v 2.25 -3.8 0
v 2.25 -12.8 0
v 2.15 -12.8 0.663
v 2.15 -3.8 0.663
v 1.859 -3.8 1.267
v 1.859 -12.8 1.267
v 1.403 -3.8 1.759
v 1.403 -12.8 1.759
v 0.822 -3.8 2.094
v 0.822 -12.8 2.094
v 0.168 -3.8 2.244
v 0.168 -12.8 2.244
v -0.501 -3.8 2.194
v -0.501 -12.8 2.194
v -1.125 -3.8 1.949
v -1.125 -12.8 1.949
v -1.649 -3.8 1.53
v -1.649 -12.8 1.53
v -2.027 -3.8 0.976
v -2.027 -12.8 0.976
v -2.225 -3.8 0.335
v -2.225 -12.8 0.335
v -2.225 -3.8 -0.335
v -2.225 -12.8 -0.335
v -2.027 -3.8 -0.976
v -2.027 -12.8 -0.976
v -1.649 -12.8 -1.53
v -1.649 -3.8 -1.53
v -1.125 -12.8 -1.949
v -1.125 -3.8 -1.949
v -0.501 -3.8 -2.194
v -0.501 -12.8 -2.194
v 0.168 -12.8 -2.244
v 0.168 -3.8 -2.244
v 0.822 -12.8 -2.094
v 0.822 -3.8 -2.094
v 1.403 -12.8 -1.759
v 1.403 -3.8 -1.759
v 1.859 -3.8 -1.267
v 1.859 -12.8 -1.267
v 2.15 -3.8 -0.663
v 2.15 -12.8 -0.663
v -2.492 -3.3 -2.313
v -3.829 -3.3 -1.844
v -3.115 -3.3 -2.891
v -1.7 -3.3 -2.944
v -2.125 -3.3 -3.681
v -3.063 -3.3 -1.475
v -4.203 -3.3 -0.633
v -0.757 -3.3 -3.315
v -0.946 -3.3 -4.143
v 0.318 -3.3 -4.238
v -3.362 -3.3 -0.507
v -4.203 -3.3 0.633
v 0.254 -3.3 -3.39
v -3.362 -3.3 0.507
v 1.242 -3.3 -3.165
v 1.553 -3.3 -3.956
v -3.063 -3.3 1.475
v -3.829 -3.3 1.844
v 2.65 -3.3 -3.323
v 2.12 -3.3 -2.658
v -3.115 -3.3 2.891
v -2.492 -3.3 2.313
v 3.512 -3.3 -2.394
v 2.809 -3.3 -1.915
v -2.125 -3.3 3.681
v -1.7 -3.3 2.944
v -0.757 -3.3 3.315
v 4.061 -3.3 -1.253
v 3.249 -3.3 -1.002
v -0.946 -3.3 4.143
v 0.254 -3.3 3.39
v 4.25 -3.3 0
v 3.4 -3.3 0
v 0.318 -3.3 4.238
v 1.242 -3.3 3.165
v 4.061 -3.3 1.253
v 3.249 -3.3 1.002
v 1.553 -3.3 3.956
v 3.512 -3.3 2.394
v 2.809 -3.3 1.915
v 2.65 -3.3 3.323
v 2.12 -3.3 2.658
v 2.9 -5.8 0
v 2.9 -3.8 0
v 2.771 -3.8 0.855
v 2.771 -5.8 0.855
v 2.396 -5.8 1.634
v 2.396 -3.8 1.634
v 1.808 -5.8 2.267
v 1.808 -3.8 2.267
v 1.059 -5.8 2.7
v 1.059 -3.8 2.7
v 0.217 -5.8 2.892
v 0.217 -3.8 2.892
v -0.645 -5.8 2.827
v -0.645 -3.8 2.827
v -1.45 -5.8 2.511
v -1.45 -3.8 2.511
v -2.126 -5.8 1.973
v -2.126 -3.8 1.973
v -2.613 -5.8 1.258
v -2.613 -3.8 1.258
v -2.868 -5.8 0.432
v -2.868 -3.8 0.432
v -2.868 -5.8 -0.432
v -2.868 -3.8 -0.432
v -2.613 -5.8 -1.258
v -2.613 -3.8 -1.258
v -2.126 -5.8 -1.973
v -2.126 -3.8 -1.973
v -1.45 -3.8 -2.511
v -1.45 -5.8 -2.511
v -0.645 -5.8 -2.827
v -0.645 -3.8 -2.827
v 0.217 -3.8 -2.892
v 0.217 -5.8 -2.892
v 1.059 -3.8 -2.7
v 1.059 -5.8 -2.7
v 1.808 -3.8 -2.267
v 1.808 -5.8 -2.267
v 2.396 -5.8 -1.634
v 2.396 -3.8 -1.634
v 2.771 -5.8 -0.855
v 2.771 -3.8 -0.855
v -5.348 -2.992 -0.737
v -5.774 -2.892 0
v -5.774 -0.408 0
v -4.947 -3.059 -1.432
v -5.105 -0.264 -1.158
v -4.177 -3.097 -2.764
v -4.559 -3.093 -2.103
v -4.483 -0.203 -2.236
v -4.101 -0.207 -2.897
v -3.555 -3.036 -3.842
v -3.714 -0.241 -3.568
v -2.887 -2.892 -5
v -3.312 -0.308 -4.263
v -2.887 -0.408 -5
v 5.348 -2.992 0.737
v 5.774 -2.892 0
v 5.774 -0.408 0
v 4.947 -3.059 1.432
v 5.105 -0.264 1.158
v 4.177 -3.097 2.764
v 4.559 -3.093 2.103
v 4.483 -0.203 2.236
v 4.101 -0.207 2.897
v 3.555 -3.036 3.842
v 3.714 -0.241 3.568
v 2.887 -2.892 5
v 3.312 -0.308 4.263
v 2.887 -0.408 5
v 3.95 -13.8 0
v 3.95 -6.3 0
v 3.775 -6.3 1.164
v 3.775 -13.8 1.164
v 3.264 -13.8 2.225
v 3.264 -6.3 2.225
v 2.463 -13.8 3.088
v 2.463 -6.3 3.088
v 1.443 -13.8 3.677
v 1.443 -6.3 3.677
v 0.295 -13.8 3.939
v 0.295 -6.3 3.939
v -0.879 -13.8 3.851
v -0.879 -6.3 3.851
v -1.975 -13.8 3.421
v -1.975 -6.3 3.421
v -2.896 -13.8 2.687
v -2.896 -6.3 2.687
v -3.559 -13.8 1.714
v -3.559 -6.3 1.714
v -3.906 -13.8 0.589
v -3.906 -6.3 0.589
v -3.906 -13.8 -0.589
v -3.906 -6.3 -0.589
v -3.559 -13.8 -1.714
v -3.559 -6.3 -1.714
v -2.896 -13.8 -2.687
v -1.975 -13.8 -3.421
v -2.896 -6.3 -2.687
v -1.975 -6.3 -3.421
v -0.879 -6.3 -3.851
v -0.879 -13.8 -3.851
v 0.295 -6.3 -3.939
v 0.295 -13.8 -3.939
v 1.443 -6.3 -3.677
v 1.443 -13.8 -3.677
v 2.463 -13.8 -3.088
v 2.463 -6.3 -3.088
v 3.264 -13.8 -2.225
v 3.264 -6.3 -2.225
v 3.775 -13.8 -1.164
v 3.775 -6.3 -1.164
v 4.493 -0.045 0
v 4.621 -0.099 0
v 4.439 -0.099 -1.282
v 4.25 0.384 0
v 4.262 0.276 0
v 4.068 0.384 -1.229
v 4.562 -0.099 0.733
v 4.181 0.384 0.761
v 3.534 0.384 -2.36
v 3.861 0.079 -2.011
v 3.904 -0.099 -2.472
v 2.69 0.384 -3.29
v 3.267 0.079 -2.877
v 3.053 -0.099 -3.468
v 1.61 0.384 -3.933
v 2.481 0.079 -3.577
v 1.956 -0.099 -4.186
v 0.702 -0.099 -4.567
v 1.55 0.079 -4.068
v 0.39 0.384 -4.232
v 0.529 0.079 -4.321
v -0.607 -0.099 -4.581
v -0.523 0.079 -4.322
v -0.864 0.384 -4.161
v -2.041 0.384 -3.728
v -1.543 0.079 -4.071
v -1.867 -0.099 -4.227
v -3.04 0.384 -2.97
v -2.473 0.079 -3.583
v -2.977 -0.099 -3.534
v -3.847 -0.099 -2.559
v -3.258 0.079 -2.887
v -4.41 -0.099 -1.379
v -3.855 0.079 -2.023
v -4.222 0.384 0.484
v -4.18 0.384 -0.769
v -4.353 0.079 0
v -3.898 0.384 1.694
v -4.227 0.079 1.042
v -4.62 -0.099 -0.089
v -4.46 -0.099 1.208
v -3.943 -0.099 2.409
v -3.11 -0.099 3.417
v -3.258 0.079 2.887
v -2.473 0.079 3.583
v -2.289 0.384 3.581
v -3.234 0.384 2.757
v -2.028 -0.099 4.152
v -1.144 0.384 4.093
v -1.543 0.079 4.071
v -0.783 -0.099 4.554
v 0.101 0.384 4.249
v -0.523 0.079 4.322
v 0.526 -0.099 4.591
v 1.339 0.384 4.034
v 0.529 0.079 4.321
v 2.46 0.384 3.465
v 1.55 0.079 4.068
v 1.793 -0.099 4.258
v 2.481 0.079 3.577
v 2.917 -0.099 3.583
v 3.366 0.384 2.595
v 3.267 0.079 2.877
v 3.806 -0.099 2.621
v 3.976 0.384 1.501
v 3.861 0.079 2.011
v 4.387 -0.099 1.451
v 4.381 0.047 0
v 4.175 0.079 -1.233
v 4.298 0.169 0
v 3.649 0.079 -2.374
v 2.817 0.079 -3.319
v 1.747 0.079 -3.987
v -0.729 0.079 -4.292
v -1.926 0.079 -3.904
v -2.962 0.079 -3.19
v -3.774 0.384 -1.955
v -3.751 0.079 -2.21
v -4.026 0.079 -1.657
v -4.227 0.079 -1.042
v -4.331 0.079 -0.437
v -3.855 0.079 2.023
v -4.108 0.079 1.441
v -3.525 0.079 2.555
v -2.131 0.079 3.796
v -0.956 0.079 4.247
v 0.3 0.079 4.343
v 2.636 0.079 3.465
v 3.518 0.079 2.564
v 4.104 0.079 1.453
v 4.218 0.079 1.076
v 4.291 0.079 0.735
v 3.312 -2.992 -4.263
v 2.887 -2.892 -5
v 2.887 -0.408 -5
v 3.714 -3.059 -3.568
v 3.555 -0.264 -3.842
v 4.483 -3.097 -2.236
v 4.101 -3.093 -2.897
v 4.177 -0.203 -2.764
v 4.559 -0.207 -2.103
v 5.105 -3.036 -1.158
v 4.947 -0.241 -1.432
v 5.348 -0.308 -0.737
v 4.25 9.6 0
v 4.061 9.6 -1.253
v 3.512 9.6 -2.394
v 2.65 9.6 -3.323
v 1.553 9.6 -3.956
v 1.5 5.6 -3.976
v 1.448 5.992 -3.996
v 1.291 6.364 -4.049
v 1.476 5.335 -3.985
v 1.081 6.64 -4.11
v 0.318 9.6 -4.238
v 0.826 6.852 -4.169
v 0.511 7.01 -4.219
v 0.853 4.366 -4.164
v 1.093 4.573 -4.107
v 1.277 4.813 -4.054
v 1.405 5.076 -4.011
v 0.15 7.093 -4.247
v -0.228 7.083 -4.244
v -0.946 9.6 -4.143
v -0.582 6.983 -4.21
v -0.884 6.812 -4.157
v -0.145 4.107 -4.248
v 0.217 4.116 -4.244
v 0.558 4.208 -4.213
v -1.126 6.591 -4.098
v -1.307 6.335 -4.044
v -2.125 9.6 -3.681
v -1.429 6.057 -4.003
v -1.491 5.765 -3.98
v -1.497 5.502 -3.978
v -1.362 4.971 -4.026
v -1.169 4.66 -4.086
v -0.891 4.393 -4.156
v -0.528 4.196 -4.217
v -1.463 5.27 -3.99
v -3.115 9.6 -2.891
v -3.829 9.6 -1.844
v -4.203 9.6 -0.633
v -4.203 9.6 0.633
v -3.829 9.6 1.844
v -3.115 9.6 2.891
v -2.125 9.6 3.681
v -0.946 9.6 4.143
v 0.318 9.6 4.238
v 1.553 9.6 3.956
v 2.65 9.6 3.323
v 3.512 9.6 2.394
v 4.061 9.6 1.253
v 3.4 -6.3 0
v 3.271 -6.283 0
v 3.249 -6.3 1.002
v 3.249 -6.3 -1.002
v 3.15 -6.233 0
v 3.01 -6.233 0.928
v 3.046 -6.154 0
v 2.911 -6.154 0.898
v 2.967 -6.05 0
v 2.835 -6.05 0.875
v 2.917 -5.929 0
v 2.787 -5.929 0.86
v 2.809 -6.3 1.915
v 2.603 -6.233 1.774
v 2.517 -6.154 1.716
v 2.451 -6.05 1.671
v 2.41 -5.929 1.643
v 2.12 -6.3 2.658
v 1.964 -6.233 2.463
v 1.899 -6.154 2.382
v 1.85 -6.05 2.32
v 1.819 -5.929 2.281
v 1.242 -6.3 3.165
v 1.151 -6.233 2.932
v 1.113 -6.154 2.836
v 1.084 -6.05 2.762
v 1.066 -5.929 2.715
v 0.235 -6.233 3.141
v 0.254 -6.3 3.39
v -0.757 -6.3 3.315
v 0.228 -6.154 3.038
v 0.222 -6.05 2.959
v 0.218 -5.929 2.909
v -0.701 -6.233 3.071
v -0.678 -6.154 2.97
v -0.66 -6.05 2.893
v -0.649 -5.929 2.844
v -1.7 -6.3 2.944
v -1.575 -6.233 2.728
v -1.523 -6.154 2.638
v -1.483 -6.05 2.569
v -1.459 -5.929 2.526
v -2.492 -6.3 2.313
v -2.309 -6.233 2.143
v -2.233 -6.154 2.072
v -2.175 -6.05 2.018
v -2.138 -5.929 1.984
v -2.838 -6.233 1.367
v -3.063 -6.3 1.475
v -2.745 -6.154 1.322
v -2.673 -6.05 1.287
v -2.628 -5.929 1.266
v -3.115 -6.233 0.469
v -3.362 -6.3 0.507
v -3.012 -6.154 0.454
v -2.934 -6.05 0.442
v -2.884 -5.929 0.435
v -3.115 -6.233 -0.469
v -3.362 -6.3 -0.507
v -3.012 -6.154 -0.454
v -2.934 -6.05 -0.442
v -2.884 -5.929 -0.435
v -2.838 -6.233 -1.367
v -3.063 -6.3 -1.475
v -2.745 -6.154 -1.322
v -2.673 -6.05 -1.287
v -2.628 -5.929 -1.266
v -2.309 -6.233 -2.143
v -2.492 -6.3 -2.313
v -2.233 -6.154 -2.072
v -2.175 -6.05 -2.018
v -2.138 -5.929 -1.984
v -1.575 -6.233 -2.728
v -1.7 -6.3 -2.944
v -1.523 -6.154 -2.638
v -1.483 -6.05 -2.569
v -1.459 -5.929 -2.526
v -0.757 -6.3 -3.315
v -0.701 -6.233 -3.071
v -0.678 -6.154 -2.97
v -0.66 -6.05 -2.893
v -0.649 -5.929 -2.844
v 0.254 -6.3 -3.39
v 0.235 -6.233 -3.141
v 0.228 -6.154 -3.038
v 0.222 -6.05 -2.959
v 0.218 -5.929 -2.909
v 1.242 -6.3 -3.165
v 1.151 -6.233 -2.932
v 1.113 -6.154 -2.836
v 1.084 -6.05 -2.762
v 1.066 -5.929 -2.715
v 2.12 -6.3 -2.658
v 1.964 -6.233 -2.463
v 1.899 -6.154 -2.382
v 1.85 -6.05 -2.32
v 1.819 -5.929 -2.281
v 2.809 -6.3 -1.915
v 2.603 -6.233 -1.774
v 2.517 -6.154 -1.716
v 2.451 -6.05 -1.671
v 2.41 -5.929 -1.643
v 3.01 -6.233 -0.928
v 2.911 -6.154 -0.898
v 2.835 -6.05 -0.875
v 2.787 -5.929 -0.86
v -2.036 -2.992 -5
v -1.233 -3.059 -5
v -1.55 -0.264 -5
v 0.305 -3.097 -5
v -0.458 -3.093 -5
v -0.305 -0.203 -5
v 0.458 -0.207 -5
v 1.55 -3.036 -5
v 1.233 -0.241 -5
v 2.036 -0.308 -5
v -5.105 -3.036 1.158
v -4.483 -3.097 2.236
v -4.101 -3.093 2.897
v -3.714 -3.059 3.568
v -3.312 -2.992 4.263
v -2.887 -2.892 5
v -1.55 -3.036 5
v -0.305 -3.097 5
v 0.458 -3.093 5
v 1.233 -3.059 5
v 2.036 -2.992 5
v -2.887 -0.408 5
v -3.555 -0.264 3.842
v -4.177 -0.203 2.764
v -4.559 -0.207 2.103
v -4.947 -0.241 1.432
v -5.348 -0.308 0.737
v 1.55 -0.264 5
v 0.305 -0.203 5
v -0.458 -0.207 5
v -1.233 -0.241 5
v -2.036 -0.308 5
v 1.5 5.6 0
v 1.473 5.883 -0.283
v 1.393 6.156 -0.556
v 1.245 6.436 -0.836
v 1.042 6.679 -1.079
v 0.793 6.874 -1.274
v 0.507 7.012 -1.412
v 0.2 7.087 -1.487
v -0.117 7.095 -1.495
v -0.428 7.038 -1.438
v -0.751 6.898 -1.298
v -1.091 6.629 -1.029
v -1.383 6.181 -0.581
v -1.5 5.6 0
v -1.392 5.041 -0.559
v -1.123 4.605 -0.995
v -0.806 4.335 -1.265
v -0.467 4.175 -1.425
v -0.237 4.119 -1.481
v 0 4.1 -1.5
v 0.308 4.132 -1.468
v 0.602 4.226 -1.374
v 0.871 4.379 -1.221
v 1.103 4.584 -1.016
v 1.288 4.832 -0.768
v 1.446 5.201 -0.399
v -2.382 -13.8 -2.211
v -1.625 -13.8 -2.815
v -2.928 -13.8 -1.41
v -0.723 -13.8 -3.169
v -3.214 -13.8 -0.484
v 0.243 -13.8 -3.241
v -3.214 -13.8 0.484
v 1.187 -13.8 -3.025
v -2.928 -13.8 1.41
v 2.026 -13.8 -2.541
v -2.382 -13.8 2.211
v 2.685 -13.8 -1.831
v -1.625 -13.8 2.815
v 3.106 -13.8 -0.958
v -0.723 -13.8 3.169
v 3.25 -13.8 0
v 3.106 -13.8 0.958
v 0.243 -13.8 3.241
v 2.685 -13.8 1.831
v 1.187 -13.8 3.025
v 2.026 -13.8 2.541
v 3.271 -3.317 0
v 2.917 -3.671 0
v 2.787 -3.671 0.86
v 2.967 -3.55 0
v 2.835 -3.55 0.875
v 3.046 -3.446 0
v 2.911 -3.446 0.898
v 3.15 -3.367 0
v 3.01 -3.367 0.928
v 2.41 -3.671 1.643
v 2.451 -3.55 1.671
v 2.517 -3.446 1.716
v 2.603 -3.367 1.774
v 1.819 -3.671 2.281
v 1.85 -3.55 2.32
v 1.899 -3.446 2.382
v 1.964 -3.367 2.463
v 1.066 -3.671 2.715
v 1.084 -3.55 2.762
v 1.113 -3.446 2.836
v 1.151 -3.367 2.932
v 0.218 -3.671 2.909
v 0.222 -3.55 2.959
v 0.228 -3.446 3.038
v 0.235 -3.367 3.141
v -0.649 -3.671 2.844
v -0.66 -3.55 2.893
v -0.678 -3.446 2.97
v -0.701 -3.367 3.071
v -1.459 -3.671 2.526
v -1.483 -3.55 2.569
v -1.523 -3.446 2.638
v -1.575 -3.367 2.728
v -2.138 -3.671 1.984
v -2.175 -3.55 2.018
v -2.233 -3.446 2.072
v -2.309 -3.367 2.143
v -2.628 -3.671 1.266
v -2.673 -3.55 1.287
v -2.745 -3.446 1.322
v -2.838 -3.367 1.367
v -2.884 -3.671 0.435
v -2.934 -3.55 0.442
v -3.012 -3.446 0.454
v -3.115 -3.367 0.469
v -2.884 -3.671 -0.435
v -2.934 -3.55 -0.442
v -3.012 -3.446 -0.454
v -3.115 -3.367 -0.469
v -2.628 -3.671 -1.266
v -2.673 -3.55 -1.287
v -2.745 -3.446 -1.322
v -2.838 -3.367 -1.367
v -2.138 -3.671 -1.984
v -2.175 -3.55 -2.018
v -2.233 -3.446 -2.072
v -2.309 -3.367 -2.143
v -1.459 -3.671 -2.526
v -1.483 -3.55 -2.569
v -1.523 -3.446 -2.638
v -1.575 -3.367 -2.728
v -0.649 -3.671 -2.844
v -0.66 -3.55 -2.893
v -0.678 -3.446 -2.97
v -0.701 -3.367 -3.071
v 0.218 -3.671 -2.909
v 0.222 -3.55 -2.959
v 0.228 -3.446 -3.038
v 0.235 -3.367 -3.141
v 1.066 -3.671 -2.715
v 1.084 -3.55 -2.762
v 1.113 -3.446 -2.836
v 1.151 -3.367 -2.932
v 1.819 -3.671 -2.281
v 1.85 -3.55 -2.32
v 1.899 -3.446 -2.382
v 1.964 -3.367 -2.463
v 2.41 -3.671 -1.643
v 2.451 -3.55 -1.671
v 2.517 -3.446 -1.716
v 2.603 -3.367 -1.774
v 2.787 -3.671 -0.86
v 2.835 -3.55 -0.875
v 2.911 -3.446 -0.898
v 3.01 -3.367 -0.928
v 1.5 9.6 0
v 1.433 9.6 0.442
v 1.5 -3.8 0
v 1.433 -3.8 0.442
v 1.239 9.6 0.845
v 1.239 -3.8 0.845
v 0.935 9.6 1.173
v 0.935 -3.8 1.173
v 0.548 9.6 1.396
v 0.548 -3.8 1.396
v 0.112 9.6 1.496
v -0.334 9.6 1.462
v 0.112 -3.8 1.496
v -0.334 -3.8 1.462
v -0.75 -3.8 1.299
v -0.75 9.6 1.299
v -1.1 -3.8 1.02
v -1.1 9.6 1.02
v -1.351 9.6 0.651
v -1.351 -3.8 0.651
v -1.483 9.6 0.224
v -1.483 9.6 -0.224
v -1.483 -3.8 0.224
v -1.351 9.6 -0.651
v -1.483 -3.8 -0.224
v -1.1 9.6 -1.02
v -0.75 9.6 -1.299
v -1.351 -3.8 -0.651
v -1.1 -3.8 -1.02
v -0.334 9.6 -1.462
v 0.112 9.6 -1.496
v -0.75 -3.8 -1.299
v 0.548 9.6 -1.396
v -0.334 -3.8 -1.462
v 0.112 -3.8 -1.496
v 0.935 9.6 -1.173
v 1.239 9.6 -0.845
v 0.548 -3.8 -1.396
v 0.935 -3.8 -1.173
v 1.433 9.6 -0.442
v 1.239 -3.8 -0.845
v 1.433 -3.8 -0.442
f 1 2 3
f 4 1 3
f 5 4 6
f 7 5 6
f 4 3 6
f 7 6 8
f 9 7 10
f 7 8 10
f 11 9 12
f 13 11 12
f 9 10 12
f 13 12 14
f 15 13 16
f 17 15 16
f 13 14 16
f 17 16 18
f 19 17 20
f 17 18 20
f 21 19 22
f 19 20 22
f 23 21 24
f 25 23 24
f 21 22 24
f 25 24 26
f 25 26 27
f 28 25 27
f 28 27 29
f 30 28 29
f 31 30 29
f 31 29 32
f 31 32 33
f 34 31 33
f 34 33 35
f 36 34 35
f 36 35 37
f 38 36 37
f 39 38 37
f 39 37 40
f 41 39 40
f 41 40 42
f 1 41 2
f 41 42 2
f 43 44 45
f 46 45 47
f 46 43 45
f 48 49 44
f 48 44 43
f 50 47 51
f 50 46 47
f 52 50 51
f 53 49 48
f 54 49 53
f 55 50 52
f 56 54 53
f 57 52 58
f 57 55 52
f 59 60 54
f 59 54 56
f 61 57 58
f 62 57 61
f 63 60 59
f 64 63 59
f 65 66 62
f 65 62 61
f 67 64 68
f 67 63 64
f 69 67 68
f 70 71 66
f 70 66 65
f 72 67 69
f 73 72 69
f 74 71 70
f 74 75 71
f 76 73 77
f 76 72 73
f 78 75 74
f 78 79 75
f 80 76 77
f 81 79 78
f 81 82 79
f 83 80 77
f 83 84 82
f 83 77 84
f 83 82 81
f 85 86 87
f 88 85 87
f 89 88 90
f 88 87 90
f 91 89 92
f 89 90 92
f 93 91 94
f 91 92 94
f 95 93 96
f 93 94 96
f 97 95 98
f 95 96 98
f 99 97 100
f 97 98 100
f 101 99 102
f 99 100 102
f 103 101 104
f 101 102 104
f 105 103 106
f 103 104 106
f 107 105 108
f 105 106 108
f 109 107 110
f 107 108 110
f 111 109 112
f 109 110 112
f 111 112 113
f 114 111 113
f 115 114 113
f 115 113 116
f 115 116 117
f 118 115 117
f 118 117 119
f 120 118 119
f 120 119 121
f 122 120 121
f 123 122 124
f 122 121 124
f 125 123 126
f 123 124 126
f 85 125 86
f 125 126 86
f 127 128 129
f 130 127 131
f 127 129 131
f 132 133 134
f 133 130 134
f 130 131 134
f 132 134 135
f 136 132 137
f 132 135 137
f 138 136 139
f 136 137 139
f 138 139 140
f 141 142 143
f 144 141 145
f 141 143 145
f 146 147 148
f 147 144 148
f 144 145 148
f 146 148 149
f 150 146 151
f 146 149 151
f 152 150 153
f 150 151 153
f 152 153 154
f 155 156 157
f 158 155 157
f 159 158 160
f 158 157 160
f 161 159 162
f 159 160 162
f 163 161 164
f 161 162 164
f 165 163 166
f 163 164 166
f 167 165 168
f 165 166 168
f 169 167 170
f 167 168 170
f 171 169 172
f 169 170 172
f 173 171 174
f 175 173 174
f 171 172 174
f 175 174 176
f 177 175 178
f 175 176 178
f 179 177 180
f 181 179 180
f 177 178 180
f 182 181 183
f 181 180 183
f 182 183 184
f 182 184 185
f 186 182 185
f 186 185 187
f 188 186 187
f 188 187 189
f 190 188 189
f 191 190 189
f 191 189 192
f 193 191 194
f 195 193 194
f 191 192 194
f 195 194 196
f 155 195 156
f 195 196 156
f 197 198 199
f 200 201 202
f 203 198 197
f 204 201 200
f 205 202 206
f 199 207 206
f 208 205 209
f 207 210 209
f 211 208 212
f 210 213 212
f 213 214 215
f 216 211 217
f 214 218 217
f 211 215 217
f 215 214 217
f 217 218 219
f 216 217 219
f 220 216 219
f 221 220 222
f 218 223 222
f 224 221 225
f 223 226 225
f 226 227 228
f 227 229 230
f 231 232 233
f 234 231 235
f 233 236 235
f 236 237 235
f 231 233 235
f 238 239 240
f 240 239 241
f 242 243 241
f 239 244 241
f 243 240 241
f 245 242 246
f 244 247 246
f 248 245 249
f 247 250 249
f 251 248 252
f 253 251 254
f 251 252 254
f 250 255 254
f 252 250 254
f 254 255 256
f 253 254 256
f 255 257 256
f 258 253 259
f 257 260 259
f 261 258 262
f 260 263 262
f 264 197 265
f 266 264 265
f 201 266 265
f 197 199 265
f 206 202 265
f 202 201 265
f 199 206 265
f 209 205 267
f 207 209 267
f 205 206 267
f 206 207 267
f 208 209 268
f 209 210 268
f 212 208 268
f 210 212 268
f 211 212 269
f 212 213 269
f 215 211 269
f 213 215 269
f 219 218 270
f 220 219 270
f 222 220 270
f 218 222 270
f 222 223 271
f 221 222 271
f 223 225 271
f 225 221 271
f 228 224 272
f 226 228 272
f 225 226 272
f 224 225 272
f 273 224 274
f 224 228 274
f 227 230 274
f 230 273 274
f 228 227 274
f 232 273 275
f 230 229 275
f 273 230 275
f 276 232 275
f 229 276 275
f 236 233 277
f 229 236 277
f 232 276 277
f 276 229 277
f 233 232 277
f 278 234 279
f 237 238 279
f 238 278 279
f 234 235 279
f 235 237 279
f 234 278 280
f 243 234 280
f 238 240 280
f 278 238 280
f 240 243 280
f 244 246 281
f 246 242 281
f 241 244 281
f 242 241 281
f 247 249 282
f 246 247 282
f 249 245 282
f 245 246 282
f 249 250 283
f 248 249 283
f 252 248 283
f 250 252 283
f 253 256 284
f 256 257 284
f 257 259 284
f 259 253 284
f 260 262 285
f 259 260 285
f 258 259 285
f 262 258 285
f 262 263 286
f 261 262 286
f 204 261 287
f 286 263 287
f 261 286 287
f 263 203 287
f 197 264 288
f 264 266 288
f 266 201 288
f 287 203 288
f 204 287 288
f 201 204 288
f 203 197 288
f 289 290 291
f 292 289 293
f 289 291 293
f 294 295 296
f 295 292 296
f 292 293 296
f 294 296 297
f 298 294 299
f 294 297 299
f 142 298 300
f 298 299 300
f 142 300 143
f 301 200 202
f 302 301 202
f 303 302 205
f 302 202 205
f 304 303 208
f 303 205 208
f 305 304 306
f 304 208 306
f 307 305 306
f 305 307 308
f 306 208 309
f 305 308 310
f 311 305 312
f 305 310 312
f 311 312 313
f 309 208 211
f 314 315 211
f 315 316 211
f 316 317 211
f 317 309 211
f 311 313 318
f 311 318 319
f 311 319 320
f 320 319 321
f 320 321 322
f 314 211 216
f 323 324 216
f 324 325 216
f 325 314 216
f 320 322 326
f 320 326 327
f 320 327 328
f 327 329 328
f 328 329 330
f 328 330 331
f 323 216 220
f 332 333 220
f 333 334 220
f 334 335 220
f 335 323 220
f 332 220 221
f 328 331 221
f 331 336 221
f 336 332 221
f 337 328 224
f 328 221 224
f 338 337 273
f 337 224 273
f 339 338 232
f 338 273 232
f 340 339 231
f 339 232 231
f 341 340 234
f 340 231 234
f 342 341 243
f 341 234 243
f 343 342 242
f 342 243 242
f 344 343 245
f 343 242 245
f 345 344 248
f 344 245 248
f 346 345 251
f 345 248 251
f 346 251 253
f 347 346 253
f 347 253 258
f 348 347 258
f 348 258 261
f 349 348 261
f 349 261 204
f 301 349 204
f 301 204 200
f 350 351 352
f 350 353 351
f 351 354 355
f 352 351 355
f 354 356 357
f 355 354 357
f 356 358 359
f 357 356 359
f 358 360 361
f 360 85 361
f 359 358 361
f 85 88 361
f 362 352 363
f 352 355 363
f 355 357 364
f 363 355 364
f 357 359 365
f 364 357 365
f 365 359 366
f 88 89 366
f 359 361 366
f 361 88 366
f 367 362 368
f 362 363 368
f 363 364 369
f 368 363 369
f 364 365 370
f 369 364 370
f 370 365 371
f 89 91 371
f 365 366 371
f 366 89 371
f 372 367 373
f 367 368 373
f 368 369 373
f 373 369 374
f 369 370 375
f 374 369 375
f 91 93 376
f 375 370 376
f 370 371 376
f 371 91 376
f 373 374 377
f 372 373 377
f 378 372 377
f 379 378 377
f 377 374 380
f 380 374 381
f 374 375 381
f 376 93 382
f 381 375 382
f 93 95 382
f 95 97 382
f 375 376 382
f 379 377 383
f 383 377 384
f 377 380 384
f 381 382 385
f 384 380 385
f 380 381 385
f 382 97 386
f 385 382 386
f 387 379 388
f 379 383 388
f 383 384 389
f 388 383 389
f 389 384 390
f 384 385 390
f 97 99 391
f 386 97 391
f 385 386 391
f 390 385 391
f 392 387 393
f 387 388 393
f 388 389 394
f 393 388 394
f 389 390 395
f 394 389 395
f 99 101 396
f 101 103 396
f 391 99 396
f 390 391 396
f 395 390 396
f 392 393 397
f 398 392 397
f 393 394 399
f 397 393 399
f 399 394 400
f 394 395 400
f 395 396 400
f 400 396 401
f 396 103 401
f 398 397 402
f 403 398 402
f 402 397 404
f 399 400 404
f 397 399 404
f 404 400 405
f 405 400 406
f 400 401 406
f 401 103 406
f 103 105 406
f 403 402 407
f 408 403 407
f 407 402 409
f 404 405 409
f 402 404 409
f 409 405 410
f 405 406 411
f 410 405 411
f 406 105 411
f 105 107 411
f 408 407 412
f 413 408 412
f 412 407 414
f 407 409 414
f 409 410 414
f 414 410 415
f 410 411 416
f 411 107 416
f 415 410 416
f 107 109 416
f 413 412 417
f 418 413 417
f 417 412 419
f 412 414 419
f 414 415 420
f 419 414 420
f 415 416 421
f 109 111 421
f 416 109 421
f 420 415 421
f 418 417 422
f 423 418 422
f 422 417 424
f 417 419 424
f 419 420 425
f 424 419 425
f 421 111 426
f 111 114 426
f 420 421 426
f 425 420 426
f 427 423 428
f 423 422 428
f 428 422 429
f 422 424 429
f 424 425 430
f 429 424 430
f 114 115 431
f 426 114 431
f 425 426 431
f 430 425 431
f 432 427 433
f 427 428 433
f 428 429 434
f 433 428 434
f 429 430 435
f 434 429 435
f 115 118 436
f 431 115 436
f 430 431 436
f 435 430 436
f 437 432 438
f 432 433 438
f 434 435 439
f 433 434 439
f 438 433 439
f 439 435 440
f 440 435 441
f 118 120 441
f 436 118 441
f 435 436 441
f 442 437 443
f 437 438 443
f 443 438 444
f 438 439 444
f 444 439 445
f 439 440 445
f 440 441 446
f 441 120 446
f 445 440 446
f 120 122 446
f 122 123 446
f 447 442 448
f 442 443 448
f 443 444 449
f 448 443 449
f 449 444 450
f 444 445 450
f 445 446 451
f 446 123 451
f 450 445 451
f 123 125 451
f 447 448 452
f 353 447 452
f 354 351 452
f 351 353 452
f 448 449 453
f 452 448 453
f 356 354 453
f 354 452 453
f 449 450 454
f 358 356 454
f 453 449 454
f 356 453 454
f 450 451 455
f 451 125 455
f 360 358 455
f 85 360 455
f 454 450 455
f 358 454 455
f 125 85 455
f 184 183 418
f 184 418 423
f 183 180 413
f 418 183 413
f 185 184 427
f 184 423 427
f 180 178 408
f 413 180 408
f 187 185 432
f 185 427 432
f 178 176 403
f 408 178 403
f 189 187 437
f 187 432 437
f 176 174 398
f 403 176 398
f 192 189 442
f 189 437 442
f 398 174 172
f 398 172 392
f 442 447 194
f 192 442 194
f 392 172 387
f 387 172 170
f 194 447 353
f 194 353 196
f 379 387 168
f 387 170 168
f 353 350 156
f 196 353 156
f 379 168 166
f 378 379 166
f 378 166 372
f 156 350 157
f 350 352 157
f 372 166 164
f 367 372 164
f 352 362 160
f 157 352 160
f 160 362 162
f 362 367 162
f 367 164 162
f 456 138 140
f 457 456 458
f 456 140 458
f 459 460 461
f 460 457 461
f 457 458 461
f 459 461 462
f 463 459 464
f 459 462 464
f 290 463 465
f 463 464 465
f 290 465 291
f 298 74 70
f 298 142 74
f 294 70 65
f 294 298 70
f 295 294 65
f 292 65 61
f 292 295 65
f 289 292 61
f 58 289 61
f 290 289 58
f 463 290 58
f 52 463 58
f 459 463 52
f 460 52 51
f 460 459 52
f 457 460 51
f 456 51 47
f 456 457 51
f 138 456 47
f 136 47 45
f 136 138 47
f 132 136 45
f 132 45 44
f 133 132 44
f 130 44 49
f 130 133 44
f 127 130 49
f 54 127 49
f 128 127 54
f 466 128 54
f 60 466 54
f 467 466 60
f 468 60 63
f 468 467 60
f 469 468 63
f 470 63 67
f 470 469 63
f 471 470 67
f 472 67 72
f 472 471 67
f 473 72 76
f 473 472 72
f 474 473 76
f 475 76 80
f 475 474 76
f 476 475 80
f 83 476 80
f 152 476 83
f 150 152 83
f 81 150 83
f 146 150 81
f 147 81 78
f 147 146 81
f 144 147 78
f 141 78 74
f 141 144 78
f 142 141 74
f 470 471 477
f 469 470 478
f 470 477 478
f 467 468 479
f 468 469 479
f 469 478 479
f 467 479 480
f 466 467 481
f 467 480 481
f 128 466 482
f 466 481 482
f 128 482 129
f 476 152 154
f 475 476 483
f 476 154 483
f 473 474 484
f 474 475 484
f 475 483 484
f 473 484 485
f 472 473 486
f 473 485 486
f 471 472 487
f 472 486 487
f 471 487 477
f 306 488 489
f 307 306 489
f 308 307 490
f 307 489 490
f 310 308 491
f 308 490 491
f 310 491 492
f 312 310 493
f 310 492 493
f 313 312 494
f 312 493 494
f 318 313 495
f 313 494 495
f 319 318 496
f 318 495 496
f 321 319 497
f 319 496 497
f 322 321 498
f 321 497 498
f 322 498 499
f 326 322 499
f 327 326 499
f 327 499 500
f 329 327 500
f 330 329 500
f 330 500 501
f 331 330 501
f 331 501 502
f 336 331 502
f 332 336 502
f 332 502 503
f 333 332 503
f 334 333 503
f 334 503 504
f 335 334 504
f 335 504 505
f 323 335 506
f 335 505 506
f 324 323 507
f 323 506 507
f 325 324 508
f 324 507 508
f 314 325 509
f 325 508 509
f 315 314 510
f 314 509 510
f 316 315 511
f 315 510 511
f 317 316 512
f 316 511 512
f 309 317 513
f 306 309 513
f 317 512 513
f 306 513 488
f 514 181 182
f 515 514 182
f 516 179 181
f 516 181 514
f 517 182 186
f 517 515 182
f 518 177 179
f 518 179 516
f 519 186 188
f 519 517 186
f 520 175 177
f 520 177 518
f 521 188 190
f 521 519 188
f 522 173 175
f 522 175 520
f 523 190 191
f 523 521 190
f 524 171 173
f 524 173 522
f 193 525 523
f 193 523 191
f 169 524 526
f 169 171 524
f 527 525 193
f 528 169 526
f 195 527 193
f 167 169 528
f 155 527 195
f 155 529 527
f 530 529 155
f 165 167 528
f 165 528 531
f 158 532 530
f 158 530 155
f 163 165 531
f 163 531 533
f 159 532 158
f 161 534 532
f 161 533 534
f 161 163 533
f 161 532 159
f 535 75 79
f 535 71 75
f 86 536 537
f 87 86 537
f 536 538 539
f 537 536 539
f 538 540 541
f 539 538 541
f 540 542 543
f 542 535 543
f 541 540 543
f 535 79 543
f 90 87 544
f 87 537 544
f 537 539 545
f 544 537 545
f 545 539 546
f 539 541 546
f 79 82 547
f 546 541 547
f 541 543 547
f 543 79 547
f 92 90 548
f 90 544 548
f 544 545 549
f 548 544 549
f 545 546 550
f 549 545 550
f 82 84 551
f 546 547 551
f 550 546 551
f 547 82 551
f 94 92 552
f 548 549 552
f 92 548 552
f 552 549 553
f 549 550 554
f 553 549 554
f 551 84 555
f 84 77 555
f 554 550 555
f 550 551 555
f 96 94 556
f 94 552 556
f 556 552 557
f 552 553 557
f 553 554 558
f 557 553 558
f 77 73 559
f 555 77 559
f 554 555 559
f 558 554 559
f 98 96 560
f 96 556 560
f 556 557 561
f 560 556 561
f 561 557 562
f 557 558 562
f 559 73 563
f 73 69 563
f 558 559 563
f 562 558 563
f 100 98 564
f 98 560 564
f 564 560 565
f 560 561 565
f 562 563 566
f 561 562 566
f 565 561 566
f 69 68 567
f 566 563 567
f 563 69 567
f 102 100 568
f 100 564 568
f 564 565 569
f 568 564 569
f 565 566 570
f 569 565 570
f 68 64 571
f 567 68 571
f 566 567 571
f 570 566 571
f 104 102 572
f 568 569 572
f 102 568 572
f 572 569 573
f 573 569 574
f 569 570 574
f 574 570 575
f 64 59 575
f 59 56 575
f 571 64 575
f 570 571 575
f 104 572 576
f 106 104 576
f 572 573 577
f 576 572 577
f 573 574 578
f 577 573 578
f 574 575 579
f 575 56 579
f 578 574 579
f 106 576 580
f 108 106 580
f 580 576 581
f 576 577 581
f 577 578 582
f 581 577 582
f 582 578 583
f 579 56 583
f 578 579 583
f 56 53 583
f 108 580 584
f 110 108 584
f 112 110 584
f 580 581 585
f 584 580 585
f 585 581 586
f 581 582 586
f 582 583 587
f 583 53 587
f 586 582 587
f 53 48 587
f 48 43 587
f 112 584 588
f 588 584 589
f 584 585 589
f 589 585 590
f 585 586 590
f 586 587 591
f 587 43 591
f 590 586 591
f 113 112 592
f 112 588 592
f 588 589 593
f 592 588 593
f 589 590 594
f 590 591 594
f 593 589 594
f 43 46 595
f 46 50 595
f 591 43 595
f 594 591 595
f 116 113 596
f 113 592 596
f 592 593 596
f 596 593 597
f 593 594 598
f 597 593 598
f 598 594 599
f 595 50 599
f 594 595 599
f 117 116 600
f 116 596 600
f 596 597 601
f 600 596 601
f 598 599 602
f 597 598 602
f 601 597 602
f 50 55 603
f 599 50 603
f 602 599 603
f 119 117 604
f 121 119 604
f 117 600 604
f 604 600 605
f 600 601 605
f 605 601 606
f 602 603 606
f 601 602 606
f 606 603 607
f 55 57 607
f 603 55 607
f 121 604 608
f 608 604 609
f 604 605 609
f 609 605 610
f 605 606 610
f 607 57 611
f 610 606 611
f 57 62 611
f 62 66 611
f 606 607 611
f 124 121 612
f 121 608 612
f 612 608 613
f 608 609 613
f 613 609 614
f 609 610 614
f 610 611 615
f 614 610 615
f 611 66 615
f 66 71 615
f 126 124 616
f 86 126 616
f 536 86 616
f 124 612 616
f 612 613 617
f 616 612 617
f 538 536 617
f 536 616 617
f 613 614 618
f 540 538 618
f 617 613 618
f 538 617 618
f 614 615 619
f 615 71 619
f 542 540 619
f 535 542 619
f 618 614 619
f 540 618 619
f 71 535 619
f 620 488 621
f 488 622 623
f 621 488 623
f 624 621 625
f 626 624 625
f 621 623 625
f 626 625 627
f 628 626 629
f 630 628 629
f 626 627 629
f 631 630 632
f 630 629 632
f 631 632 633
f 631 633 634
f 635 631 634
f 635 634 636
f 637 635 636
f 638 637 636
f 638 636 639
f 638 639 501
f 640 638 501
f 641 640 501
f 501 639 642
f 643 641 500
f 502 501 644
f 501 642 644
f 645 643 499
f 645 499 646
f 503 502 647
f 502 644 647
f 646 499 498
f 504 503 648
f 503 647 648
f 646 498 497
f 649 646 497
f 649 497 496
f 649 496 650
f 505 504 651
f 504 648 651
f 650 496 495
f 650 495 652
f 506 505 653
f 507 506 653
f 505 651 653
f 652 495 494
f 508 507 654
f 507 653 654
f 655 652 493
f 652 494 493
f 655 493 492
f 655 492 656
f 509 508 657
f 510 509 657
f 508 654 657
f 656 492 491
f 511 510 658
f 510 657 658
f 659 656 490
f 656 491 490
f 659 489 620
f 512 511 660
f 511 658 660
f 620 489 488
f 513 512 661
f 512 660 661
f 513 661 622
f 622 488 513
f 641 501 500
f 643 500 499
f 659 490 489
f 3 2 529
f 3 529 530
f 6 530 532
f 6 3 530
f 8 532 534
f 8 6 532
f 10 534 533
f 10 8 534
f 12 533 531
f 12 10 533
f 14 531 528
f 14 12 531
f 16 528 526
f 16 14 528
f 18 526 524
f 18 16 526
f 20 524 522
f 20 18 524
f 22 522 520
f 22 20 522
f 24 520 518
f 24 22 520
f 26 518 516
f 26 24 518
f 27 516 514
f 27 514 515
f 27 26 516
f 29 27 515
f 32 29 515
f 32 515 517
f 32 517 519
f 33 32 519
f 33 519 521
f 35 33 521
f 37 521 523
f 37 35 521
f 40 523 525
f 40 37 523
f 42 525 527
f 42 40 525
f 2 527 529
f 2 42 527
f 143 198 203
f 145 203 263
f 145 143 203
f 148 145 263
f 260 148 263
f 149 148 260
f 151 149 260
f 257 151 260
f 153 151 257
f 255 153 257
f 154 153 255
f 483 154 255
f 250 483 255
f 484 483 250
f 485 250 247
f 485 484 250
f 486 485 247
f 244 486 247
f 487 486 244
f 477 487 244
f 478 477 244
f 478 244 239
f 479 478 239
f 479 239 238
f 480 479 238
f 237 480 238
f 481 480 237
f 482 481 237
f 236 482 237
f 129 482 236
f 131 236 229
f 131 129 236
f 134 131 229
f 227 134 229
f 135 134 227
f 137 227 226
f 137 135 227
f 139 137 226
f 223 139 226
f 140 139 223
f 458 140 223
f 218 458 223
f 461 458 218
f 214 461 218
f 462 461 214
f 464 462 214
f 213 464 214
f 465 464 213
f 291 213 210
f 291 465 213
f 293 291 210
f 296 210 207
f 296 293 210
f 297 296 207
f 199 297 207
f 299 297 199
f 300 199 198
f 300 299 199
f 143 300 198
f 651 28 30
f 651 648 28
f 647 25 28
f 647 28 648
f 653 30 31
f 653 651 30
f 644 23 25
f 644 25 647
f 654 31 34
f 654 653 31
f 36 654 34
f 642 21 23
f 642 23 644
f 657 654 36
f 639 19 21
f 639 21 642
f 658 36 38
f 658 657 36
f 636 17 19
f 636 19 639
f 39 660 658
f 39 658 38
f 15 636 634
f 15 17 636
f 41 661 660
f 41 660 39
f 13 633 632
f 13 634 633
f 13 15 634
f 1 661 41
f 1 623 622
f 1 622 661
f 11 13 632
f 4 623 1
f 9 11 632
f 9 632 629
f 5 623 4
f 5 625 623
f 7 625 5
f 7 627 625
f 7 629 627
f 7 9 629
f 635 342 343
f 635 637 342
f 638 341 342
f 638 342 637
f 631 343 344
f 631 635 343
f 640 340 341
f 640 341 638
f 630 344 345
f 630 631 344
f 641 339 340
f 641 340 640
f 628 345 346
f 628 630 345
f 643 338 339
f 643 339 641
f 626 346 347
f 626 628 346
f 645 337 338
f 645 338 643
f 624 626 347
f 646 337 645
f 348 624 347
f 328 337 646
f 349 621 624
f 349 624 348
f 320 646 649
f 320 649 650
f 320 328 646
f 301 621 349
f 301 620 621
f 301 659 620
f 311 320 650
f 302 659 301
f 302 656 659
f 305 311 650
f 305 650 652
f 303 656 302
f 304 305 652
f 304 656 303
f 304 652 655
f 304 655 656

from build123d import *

# Parameters (mm, degrees)
SKETCH1_R           = 4.25
BOSS_EXTRUDE1_DEPTH = 9.6
BOSS_EXTRUDE2_DEPTH = 3.3
SKETCH3_OUTSIDE_W   = 42.178
SKETCH3_OUTSIDE_H   = 40.63
SKETCH3_OUTSIDE_R   = 4.25
CUT_EXTRUDE4_DEPTH  = 3.3
CUT_EXTRUDE4_TAPER  = 75
SKETCH5_OUTSIDE_W   = 42.178
SKETCH5_OUTSIDE_H   = 40.63
SKETCH5_OUTSIDE_R   = 4.25
CUT_EXTRUDE5_DEPTH  = 3.3
CUT_EXTRUDE5_TAPER  = 75
SKETCH6_R           = 2.9
BOSS_EXTRUDE3_DEPTH = 3
SKETCH7_R           = 3.95
BOSS_EXTRUDE4_DEPTH = 7.5
SKETCH8_R           = 1.5
CUT_EXTRUDE6_DEPTH  = 24.4
SKETCH9_R           = 2.25
CUT_EXTRUDE7_DEPTH  = 10
FILLET1_R           = 0.5
SKETCH10_R          = 1.5
CUT_EXTRUDE8_DEPTH  = 6.0000001
CHAMFER1_SIZE       = 1


with BuildPart() as part:
    # Sketch1 → Boss-Extrude1 (new body)
    with BuildSketch(Plane(origin=(0, 0, 0), x_dir=(1, 0, 0), z_dir=(0, 1, 0))):
        Circle(SKETCH1_R)
    extrude(amount=BOSS_EXTRUDE1_DEPTH)

    # Sketch2 → Boss-Extrude2 (add)
    with BuildSketch(Plane.XZ):
        Polygon((-2.886751346, 5), (-5.773502692, 0), (-2.886751346, -5), (2.886751346, -5), (5.773502692, 0), (2.886751346, 5), align=None)
    extrude(amount=BOSS_EXTRUDE2_DEPTH)

    # Sketch3 outside → Cut-Extrude4 (cut)
    with BuildSketch(Plane.XZ.offset(3.3)):
        Rectangle(SKETCH3_OUTSIDE_W, SKETCH3_OUTSIDE_H)
        Circle(SKETCH3_OUTSIDE_R, mode=Mode.SUBTRACT)
    extrude(amount=-CUT_EXTRUDE4_DEPTH, taper=CUT_EXTRUDE4_TAPER, mode=Mode.SUBTRACT)

    # Sketch5 outside → Cut-Extrude5 (cut)
    with BuildSketch(Plane(origin=(0, 0, 0), x_dir=(1, 0, 0), z_dir=(0, 1, 0))):
        Rectangle(SKETCH5_OUTSIDE_W, SKETCH5_OUTSIDE_H)
        Circle(SKETCH5_OUTSIDE_R, mode=Mode.SUBTRACT)
    extrude(amount=-CUT_EXTRUDE5_DEPTH, taper=CUT_EXTRUDE5_TAPER, mode=Mode.SUBTRACT)

    # Sketch6 → Boss-Extrude3 (add)
    with BuildSketch(Plane.XZ.offset(3.3)):
        Circle(SKETCH6_R)
    extrude(amount=BOSS_EXTRUDE3_DEPTH)

    # Sketch7 → Boss-Extrude4 (add)
    with BuildSketch(Plane.XZ.offset(6.3)):
        Circle(SKETCH7_R)
    extrude(amount=BOSS_EXTRUDE4_DEPTH)

    # Sketch8 → Cut-Extrude6 (cut, through all)
    with BuildSketch(Plane.XZ.offset(13.8)):
        Circle(SKETCH8_R)
    extrude(amount=-CUT_EXTRUDE6_DEPTH, mode=Mode.SUBTRACT)

    # Sketch9 → Cut-Extrude7 (cut)
    with BuildSketch(Plane.XZ.offset(13.8)):
        Circle(SKETCH9_R)
    extrude(amount=-CUT_EXTRUDE7_DEPTH, mode=Mode.SUBTRACT)

    # Fillet1
    fillet1_edges = [part.edges().sort_by_distance(p)[0] for p in [
        (-4.25, 0, 0),
        (-2.9, -3.3, 0),
        (-2.9, -6.3, 0),
    ]]
    fillet(fillet1_edges, radius=FILLET1_R)

    # Sketch10 → Cut-Extrude8 (cut, through all)
    with BuildSketch(Plane.XY):
        with Locations((0, 5.6)):
            Circle(SKETCH10_R)
    extrude(amount=-CUT_EXTRUDE8_DEPTH, mode=Mode.SUBTRACT)

    # Chamfer1
    chamfer1_edges = [part.edges().sort_by_distance(p)[0] for p in [
        (-2.25, -13.8, 0),
    ]]
    chamfer(chamfer1_edges, length=CHAMFER1_SIZE)


solid = part.part
